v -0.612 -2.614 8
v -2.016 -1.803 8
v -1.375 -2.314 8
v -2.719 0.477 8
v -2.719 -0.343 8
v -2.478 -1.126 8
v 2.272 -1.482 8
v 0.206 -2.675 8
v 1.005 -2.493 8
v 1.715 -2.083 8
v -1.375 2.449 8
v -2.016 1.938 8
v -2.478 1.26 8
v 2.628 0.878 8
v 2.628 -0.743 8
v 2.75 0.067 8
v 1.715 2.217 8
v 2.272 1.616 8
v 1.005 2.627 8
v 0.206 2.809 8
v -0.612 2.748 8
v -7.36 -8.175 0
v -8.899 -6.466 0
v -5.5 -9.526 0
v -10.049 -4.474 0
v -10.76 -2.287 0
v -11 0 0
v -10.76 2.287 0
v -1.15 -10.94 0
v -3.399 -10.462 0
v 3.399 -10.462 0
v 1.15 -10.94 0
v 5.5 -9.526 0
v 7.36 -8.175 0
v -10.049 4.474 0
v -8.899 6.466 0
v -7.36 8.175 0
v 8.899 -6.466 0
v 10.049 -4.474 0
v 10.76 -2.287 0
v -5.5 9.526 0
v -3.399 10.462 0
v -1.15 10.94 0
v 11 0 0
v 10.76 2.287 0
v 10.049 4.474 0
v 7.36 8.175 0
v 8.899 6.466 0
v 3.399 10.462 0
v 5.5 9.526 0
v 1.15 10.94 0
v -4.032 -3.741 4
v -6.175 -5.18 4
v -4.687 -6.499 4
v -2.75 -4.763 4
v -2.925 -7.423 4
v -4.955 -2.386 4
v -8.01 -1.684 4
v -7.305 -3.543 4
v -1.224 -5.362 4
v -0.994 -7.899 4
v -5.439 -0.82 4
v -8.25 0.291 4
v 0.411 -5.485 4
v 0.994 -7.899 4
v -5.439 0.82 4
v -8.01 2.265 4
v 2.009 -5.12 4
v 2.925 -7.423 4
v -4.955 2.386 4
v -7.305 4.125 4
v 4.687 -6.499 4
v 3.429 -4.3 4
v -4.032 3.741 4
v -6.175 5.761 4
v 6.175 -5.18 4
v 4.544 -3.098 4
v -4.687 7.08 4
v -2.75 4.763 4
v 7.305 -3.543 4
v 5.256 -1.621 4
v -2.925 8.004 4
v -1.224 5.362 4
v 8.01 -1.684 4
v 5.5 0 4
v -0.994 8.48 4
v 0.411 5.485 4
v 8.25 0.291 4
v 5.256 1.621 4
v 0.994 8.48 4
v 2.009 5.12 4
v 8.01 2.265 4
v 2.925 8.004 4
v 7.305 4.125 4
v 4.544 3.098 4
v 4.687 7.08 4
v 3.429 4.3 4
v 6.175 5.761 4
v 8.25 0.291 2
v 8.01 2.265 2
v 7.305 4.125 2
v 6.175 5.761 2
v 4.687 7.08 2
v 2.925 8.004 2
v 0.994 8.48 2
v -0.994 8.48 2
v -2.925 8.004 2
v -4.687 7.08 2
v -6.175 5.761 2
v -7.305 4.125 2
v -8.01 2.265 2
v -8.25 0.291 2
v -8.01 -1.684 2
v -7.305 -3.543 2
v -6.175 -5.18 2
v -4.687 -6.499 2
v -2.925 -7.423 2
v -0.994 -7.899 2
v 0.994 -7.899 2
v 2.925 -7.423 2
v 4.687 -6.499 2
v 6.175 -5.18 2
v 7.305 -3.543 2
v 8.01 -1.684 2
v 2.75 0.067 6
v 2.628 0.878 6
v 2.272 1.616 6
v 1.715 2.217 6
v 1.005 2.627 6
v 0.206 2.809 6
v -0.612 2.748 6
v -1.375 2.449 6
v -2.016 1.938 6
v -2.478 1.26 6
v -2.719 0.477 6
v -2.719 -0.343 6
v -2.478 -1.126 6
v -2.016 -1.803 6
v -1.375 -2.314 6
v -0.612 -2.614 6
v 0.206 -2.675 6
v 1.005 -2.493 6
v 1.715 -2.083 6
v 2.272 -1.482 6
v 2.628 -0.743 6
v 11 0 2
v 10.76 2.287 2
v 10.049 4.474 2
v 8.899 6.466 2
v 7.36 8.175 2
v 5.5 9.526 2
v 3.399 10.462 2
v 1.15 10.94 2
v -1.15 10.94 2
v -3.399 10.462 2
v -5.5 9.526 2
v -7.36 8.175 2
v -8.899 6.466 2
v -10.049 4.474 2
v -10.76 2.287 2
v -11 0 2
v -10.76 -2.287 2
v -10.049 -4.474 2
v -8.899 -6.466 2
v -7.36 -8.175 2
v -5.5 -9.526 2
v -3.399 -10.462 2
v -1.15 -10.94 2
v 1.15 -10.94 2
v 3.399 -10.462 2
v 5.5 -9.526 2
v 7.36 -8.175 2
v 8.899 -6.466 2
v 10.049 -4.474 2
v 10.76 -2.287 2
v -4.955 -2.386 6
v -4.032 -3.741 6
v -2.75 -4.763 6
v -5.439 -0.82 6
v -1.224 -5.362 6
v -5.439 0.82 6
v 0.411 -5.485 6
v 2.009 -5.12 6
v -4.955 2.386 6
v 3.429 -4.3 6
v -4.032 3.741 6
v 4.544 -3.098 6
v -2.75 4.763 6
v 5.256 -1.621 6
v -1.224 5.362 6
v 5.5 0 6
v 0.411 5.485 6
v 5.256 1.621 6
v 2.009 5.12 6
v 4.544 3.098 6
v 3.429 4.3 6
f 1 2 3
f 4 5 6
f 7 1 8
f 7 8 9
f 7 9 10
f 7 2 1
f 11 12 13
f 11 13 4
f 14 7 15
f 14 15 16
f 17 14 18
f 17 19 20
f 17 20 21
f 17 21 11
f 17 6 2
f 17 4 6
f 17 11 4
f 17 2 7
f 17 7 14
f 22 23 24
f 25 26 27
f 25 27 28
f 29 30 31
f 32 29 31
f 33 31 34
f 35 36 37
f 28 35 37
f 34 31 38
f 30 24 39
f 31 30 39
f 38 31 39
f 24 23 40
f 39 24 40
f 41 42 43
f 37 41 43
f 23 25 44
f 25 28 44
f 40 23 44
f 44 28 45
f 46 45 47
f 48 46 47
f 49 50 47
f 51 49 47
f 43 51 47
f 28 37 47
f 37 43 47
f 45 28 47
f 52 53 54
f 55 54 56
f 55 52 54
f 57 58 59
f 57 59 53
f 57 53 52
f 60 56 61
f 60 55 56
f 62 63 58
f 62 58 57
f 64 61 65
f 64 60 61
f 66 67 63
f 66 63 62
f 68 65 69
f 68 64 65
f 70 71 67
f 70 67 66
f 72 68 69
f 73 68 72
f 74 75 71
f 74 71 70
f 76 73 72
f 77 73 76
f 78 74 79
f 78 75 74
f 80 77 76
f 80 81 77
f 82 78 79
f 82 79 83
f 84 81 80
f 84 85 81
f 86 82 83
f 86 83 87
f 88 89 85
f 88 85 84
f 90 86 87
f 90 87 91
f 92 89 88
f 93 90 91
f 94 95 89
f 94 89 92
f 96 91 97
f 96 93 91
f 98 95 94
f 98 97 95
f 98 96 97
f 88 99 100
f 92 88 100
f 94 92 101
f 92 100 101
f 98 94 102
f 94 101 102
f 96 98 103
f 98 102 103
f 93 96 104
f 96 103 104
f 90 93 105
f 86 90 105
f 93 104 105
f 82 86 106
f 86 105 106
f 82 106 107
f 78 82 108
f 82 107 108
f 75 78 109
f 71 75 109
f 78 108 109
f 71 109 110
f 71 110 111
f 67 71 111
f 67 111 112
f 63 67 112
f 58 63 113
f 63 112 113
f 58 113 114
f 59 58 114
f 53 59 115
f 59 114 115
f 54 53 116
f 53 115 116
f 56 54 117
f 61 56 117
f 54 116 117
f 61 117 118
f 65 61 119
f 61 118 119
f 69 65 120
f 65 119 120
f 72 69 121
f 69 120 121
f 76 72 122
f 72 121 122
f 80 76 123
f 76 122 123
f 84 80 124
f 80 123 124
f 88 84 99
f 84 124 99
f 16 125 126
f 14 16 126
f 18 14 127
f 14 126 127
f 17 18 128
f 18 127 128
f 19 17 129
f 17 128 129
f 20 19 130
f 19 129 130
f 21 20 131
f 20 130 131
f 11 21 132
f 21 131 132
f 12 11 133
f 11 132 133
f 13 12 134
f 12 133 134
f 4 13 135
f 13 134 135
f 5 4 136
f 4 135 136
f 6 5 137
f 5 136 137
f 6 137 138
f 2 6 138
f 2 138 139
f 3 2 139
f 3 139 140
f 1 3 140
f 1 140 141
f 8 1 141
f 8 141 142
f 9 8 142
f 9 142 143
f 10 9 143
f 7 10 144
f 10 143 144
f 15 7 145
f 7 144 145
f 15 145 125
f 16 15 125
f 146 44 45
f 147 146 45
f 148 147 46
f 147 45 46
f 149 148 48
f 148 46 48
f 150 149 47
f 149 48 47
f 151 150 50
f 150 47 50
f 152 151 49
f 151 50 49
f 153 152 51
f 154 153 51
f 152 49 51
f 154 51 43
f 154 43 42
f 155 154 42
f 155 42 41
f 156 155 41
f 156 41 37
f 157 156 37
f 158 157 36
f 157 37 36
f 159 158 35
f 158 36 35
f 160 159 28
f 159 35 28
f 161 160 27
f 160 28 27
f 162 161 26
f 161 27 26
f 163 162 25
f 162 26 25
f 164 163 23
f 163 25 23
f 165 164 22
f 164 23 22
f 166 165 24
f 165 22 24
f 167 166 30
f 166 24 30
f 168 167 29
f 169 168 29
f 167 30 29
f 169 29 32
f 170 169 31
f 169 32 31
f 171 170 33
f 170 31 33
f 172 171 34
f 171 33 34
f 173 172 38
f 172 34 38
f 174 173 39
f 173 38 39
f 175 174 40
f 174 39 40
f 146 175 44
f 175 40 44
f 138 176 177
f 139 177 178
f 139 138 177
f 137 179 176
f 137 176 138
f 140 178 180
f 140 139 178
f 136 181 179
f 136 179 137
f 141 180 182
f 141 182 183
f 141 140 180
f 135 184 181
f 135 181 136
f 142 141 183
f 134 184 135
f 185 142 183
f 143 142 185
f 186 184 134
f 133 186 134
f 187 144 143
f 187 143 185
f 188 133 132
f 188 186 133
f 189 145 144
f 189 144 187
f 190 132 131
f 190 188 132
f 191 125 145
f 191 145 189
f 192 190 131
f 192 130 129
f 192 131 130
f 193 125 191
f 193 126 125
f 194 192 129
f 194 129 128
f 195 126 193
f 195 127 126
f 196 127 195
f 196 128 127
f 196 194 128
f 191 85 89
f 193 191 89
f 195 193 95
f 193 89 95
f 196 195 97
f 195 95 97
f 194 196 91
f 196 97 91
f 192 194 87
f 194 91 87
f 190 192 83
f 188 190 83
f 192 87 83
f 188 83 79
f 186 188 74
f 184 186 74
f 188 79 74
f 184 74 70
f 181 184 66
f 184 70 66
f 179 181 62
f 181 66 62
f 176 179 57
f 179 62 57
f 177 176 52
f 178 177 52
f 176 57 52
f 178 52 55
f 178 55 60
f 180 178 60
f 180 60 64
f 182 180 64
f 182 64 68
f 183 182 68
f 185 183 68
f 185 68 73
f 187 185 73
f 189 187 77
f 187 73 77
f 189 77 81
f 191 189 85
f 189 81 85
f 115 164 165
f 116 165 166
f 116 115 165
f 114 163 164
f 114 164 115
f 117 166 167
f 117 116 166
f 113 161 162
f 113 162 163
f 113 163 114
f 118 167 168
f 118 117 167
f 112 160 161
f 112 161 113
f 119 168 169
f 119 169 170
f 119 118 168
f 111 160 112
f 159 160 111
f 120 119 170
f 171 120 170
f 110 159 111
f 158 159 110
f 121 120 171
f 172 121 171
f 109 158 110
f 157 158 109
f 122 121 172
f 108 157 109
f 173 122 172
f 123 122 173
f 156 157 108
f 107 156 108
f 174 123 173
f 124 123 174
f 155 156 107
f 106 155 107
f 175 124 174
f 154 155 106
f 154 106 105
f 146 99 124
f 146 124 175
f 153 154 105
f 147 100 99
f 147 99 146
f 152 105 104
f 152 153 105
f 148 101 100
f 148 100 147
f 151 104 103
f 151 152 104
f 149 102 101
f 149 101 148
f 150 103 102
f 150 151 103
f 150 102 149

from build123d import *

# Parameters (mm, degrees)
F0_R     = 11
F1_DEPTH = 2
F2_R     = 8.25
F3_DEPTH = 2
F4_R     = 5.5
F5_DEPTH = 2
F6_R     = 2.75
F7_DEPTH = 2


# Not quite as in the source:
# - a feature names something its author has since deleted; it is built from what else it names


with BuildPart() as f1:
    # F0 (on Top) → F1 (new body)
    with BuildSketch(Plane.XY):
        Circle(F0_R)
    extrude(amount=F1_DEPTH)

    # F2 (on face) → F3 (join)
    with BuildSketch(Plane.XY.offset(2)):
        with Locations((0, 0.2906154259)):
            Circle(F2_R)
    extrude(amount=F3_DEPTH)

    # F4 (on face) → F5 (join)
    with BuildSketch(Plane.XY.offset(4)):
        Circle(F4_R)
    extrude(amount=F5_DEPTH)

    # F6 (on face) → F7 (join)
    with BuildSketch(Plane.XY.offset(6)):
        with Locations((0, 0.0671765927)):
            Circle(F6_R)
    extrude(amount=F7_DEPTH)


solid = f1.part
